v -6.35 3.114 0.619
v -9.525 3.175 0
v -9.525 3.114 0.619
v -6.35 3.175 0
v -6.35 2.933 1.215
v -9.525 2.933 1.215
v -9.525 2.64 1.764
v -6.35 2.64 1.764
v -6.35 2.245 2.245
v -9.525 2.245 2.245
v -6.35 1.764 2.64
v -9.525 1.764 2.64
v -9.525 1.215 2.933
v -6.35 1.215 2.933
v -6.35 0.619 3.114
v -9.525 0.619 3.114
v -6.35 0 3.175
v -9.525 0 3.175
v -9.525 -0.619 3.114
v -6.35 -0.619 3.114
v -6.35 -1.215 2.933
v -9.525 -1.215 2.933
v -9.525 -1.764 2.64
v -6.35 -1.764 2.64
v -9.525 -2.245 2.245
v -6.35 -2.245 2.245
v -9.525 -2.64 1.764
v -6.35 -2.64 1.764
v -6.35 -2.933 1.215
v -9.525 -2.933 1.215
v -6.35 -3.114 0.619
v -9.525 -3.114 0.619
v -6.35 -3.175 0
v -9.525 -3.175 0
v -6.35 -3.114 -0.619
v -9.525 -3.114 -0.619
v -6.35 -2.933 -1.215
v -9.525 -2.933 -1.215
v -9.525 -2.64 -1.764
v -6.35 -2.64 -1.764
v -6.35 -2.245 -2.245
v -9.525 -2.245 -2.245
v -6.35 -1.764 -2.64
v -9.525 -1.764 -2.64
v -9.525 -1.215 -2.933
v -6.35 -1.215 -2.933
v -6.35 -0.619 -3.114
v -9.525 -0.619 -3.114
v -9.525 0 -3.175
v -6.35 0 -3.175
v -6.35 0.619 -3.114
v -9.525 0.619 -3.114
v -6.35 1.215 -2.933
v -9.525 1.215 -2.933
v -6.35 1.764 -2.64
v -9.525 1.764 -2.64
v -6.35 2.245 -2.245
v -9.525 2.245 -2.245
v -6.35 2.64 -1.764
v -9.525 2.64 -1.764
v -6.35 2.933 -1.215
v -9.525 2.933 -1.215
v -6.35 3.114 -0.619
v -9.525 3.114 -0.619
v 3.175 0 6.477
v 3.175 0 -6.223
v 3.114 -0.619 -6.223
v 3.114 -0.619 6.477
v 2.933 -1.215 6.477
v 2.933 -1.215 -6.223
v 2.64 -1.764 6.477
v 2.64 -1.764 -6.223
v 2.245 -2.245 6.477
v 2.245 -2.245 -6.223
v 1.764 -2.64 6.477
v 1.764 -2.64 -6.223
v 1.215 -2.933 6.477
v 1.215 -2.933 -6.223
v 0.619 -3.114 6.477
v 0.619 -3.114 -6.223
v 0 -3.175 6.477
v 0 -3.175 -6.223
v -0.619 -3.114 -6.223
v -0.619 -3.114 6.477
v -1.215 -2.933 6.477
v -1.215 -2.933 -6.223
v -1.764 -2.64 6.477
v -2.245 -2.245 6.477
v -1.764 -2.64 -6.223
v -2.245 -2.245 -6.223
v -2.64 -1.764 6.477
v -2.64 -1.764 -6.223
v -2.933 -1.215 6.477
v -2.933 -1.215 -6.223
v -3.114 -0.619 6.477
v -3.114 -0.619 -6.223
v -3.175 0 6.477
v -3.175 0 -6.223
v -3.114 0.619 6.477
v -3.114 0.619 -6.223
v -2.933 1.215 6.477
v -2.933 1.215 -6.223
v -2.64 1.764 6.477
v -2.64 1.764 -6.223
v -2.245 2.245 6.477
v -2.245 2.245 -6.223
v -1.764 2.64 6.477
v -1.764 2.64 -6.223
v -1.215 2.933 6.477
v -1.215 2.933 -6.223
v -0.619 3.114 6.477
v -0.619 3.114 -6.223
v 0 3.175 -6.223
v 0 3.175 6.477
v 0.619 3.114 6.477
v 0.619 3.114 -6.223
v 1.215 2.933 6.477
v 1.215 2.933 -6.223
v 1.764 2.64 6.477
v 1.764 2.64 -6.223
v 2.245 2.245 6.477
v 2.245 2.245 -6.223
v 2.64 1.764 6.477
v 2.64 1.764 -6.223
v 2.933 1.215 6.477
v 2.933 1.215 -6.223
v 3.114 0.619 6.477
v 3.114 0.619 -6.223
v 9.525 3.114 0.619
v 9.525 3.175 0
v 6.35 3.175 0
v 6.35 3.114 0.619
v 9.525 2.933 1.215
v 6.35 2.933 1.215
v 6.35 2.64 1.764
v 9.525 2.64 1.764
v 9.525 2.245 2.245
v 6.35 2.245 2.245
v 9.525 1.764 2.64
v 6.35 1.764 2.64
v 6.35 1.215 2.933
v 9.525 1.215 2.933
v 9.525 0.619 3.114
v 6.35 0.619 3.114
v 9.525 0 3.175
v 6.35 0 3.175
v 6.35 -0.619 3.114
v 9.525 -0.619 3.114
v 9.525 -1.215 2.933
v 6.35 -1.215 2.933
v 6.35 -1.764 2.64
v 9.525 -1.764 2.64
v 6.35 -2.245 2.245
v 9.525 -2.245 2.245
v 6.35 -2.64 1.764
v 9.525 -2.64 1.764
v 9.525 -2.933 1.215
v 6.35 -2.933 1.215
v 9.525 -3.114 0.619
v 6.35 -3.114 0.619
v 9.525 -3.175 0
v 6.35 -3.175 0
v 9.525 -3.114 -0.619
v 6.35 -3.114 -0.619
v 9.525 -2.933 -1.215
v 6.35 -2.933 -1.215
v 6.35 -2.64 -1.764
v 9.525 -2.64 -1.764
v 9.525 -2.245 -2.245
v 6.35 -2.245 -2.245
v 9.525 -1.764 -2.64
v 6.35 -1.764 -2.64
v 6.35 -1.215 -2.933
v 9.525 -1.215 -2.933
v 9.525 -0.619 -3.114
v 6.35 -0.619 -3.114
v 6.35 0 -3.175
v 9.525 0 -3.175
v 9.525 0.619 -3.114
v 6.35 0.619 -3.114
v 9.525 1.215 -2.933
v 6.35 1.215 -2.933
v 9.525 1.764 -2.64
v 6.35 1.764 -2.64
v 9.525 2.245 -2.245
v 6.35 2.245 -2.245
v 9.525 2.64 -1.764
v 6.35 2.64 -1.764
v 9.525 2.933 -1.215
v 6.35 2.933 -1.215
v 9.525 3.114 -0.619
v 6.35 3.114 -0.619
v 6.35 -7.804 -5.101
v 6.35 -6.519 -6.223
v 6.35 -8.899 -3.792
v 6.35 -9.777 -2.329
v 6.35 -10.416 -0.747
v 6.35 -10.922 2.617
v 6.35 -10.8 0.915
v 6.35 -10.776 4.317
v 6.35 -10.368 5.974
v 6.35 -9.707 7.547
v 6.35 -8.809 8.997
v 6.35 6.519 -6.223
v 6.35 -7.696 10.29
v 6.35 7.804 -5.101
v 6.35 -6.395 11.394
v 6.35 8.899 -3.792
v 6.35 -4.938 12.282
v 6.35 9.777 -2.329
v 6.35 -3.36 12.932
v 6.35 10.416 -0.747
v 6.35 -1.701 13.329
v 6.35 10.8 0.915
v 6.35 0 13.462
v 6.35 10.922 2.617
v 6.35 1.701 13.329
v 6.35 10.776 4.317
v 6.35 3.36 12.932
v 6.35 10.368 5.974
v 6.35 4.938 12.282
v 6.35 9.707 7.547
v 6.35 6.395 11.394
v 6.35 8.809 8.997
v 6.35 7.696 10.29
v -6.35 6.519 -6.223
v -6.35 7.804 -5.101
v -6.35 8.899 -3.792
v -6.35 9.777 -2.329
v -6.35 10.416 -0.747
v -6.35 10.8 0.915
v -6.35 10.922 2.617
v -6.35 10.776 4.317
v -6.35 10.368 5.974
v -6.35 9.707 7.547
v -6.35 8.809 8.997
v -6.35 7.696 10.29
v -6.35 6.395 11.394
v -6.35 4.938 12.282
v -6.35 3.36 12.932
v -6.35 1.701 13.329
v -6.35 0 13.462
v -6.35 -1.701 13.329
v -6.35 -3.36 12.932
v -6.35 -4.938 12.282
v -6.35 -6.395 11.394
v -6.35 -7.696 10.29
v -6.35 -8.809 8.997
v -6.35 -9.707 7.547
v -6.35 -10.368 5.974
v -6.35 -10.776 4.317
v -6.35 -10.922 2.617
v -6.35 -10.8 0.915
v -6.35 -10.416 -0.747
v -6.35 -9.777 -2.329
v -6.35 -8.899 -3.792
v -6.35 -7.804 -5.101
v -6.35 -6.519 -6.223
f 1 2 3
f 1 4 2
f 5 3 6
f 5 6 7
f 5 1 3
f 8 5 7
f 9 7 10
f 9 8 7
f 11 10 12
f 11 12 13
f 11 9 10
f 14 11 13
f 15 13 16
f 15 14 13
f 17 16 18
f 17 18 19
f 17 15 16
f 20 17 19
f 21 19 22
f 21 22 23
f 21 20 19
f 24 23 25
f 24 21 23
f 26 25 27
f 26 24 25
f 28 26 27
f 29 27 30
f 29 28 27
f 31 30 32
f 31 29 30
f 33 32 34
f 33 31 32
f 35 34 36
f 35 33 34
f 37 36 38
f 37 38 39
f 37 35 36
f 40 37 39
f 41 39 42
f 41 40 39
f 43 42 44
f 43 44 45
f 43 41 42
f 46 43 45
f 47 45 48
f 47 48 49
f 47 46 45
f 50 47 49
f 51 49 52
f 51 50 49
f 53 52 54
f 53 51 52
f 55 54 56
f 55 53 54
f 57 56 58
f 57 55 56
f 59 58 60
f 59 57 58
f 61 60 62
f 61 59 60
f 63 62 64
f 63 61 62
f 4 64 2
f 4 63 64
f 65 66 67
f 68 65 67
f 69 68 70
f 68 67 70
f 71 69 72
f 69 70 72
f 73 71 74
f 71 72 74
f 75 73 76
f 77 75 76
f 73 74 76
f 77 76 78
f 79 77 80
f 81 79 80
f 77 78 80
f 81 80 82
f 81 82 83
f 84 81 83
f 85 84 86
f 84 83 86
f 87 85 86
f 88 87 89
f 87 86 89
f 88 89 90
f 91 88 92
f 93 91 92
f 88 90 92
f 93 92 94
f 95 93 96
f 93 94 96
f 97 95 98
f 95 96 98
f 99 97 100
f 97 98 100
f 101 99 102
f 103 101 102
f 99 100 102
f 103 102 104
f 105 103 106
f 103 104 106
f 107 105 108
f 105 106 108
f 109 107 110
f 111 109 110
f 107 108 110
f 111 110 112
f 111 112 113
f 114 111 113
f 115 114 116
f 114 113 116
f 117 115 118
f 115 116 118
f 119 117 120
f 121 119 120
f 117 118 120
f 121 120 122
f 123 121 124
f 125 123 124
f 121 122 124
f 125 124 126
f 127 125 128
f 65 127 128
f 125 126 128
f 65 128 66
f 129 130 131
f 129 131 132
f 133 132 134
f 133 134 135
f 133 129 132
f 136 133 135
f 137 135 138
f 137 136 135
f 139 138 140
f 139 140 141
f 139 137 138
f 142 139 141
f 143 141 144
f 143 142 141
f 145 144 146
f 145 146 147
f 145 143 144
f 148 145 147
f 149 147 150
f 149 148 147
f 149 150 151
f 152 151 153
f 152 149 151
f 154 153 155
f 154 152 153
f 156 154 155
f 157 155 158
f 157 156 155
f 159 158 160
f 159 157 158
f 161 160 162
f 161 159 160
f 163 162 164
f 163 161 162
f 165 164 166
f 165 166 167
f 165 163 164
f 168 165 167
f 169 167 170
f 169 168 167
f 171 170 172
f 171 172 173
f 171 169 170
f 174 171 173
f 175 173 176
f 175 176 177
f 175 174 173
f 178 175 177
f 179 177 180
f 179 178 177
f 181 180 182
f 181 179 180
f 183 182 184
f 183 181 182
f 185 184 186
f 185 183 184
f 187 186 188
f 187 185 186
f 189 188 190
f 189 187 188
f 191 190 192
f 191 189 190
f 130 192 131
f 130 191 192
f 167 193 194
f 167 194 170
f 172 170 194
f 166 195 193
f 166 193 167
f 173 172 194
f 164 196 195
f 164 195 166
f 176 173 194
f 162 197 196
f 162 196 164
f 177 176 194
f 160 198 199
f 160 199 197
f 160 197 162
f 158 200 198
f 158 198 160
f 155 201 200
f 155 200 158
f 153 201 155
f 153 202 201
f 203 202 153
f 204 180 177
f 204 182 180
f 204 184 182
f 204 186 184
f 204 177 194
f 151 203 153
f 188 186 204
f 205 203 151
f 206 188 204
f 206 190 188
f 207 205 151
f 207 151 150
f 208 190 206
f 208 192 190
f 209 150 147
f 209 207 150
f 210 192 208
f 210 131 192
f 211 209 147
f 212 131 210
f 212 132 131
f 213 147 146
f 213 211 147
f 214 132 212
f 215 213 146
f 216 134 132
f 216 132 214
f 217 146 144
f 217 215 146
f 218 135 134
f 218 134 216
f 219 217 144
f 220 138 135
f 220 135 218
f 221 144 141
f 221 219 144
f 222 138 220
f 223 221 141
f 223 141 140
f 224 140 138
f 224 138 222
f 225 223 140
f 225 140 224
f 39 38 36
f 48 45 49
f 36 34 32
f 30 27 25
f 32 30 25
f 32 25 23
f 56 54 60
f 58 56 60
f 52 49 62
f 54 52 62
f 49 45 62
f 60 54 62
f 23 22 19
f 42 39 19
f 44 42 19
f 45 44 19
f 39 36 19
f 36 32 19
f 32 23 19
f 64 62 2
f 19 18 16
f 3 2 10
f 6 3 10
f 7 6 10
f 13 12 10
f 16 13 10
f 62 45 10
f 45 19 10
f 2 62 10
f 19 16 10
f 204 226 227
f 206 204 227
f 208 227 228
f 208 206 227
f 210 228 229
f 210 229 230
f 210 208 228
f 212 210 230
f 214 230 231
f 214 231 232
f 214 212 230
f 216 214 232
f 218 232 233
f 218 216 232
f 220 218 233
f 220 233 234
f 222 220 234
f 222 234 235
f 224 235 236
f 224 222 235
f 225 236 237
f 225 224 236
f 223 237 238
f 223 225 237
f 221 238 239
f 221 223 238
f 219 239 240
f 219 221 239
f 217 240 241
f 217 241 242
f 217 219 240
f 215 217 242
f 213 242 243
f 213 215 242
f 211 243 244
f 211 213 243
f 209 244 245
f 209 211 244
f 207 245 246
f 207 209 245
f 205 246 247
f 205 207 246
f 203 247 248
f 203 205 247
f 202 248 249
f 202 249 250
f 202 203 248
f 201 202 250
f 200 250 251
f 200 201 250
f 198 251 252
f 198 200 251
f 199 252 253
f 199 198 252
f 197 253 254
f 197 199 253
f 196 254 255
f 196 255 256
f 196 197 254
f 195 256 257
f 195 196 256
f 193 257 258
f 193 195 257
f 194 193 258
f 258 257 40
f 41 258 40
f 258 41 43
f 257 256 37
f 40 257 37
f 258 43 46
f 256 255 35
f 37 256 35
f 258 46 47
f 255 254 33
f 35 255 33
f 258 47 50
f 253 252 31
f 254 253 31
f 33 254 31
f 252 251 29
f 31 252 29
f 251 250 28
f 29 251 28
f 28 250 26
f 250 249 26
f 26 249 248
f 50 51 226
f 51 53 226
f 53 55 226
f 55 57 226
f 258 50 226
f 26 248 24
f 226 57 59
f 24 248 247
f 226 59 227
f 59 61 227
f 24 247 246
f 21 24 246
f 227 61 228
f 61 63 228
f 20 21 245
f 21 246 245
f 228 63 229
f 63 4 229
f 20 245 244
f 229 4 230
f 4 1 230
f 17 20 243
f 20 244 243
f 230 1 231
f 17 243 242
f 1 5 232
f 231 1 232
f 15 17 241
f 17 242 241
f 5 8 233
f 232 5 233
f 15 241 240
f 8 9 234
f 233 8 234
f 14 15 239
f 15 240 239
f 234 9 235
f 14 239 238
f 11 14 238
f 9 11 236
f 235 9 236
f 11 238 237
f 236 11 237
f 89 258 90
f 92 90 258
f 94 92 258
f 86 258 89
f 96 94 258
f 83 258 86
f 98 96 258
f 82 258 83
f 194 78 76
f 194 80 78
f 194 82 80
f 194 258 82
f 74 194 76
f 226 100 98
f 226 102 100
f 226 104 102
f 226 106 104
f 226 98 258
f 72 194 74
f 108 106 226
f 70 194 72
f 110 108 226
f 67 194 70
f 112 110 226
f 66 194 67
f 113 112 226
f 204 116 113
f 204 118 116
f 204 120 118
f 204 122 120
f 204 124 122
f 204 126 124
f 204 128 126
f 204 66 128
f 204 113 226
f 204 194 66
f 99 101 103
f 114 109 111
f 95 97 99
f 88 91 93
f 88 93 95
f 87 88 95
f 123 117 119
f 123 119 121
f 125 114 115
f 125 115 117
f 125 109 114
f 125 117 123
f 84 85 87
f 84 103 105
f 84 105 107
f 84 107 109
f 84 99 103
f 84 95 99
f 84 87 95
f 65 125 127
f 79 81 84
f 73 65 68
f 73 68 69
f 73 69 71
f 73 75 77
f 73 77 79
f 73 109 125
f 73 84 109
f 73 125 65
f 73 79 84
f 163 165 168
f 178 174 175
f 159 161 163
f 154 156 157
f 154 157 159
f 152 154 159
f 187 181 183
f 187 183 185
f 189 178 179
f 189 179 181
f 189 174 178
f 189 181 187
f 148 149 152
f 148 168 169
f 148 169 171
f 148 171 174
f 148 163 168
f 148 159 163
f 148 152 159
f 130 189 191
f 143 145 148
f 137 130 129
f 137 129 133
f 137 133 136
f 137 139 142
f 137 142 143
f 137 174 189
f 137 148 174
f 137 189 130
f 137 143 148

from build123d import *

# Parameters (mm, degrees)
F1_DEPTH = 6.35
F2_R     = 3.175
F3_DEPTH = 9.525
F4_R     = 3.175
F5_DEPTH = 9.525
F6_R     = 3.175
F7_DEPTH = 12.7


with BuildPart() as f1:
    # F0 (on Right) → F1 (new body, symmetric)
    with BuildSketch(Plane.YZ):
        with BuildLine():
            Line((-6.519195886, -6.223), (6.519195886, -6.223))
            ThreePointArc((6.519195886, -6.223), (0, 13.462), (-6.519195886, -6.223))
        make_face()
    extrude(amount=F1_DEPTH, both=True)



with BuildPart() as f3:
    # F2 (on Right) → F3 (new body, symmetric)
    with BuildSketch(Plane.YZ):
        Circle(F2_R)
    extrude(amount=F3_DEPTH, both=True)


with BuildPart() as f1_1:
    add(f1.part)

    add(f3.part)  # F5 merges F3
    # F4 (on Right) → F5 (join, symmetric)
    with BuildSketch(Plane.YZ):
        Circle(F4_R)
    extrude(amount=F5_DEPTH, both=True)

    # F6 (on face) → F7 (cut)
    with BuildSketch(Plane(origin=(0, 0, -6.223), x_dir=(1, 0, 0), z_dir=(0, 0, -1))):
        Circle(F6_R)
    extrude(amount=-F7_DEPTH, mode=Mode.SUBTRACT)


solid = f1_1.part
